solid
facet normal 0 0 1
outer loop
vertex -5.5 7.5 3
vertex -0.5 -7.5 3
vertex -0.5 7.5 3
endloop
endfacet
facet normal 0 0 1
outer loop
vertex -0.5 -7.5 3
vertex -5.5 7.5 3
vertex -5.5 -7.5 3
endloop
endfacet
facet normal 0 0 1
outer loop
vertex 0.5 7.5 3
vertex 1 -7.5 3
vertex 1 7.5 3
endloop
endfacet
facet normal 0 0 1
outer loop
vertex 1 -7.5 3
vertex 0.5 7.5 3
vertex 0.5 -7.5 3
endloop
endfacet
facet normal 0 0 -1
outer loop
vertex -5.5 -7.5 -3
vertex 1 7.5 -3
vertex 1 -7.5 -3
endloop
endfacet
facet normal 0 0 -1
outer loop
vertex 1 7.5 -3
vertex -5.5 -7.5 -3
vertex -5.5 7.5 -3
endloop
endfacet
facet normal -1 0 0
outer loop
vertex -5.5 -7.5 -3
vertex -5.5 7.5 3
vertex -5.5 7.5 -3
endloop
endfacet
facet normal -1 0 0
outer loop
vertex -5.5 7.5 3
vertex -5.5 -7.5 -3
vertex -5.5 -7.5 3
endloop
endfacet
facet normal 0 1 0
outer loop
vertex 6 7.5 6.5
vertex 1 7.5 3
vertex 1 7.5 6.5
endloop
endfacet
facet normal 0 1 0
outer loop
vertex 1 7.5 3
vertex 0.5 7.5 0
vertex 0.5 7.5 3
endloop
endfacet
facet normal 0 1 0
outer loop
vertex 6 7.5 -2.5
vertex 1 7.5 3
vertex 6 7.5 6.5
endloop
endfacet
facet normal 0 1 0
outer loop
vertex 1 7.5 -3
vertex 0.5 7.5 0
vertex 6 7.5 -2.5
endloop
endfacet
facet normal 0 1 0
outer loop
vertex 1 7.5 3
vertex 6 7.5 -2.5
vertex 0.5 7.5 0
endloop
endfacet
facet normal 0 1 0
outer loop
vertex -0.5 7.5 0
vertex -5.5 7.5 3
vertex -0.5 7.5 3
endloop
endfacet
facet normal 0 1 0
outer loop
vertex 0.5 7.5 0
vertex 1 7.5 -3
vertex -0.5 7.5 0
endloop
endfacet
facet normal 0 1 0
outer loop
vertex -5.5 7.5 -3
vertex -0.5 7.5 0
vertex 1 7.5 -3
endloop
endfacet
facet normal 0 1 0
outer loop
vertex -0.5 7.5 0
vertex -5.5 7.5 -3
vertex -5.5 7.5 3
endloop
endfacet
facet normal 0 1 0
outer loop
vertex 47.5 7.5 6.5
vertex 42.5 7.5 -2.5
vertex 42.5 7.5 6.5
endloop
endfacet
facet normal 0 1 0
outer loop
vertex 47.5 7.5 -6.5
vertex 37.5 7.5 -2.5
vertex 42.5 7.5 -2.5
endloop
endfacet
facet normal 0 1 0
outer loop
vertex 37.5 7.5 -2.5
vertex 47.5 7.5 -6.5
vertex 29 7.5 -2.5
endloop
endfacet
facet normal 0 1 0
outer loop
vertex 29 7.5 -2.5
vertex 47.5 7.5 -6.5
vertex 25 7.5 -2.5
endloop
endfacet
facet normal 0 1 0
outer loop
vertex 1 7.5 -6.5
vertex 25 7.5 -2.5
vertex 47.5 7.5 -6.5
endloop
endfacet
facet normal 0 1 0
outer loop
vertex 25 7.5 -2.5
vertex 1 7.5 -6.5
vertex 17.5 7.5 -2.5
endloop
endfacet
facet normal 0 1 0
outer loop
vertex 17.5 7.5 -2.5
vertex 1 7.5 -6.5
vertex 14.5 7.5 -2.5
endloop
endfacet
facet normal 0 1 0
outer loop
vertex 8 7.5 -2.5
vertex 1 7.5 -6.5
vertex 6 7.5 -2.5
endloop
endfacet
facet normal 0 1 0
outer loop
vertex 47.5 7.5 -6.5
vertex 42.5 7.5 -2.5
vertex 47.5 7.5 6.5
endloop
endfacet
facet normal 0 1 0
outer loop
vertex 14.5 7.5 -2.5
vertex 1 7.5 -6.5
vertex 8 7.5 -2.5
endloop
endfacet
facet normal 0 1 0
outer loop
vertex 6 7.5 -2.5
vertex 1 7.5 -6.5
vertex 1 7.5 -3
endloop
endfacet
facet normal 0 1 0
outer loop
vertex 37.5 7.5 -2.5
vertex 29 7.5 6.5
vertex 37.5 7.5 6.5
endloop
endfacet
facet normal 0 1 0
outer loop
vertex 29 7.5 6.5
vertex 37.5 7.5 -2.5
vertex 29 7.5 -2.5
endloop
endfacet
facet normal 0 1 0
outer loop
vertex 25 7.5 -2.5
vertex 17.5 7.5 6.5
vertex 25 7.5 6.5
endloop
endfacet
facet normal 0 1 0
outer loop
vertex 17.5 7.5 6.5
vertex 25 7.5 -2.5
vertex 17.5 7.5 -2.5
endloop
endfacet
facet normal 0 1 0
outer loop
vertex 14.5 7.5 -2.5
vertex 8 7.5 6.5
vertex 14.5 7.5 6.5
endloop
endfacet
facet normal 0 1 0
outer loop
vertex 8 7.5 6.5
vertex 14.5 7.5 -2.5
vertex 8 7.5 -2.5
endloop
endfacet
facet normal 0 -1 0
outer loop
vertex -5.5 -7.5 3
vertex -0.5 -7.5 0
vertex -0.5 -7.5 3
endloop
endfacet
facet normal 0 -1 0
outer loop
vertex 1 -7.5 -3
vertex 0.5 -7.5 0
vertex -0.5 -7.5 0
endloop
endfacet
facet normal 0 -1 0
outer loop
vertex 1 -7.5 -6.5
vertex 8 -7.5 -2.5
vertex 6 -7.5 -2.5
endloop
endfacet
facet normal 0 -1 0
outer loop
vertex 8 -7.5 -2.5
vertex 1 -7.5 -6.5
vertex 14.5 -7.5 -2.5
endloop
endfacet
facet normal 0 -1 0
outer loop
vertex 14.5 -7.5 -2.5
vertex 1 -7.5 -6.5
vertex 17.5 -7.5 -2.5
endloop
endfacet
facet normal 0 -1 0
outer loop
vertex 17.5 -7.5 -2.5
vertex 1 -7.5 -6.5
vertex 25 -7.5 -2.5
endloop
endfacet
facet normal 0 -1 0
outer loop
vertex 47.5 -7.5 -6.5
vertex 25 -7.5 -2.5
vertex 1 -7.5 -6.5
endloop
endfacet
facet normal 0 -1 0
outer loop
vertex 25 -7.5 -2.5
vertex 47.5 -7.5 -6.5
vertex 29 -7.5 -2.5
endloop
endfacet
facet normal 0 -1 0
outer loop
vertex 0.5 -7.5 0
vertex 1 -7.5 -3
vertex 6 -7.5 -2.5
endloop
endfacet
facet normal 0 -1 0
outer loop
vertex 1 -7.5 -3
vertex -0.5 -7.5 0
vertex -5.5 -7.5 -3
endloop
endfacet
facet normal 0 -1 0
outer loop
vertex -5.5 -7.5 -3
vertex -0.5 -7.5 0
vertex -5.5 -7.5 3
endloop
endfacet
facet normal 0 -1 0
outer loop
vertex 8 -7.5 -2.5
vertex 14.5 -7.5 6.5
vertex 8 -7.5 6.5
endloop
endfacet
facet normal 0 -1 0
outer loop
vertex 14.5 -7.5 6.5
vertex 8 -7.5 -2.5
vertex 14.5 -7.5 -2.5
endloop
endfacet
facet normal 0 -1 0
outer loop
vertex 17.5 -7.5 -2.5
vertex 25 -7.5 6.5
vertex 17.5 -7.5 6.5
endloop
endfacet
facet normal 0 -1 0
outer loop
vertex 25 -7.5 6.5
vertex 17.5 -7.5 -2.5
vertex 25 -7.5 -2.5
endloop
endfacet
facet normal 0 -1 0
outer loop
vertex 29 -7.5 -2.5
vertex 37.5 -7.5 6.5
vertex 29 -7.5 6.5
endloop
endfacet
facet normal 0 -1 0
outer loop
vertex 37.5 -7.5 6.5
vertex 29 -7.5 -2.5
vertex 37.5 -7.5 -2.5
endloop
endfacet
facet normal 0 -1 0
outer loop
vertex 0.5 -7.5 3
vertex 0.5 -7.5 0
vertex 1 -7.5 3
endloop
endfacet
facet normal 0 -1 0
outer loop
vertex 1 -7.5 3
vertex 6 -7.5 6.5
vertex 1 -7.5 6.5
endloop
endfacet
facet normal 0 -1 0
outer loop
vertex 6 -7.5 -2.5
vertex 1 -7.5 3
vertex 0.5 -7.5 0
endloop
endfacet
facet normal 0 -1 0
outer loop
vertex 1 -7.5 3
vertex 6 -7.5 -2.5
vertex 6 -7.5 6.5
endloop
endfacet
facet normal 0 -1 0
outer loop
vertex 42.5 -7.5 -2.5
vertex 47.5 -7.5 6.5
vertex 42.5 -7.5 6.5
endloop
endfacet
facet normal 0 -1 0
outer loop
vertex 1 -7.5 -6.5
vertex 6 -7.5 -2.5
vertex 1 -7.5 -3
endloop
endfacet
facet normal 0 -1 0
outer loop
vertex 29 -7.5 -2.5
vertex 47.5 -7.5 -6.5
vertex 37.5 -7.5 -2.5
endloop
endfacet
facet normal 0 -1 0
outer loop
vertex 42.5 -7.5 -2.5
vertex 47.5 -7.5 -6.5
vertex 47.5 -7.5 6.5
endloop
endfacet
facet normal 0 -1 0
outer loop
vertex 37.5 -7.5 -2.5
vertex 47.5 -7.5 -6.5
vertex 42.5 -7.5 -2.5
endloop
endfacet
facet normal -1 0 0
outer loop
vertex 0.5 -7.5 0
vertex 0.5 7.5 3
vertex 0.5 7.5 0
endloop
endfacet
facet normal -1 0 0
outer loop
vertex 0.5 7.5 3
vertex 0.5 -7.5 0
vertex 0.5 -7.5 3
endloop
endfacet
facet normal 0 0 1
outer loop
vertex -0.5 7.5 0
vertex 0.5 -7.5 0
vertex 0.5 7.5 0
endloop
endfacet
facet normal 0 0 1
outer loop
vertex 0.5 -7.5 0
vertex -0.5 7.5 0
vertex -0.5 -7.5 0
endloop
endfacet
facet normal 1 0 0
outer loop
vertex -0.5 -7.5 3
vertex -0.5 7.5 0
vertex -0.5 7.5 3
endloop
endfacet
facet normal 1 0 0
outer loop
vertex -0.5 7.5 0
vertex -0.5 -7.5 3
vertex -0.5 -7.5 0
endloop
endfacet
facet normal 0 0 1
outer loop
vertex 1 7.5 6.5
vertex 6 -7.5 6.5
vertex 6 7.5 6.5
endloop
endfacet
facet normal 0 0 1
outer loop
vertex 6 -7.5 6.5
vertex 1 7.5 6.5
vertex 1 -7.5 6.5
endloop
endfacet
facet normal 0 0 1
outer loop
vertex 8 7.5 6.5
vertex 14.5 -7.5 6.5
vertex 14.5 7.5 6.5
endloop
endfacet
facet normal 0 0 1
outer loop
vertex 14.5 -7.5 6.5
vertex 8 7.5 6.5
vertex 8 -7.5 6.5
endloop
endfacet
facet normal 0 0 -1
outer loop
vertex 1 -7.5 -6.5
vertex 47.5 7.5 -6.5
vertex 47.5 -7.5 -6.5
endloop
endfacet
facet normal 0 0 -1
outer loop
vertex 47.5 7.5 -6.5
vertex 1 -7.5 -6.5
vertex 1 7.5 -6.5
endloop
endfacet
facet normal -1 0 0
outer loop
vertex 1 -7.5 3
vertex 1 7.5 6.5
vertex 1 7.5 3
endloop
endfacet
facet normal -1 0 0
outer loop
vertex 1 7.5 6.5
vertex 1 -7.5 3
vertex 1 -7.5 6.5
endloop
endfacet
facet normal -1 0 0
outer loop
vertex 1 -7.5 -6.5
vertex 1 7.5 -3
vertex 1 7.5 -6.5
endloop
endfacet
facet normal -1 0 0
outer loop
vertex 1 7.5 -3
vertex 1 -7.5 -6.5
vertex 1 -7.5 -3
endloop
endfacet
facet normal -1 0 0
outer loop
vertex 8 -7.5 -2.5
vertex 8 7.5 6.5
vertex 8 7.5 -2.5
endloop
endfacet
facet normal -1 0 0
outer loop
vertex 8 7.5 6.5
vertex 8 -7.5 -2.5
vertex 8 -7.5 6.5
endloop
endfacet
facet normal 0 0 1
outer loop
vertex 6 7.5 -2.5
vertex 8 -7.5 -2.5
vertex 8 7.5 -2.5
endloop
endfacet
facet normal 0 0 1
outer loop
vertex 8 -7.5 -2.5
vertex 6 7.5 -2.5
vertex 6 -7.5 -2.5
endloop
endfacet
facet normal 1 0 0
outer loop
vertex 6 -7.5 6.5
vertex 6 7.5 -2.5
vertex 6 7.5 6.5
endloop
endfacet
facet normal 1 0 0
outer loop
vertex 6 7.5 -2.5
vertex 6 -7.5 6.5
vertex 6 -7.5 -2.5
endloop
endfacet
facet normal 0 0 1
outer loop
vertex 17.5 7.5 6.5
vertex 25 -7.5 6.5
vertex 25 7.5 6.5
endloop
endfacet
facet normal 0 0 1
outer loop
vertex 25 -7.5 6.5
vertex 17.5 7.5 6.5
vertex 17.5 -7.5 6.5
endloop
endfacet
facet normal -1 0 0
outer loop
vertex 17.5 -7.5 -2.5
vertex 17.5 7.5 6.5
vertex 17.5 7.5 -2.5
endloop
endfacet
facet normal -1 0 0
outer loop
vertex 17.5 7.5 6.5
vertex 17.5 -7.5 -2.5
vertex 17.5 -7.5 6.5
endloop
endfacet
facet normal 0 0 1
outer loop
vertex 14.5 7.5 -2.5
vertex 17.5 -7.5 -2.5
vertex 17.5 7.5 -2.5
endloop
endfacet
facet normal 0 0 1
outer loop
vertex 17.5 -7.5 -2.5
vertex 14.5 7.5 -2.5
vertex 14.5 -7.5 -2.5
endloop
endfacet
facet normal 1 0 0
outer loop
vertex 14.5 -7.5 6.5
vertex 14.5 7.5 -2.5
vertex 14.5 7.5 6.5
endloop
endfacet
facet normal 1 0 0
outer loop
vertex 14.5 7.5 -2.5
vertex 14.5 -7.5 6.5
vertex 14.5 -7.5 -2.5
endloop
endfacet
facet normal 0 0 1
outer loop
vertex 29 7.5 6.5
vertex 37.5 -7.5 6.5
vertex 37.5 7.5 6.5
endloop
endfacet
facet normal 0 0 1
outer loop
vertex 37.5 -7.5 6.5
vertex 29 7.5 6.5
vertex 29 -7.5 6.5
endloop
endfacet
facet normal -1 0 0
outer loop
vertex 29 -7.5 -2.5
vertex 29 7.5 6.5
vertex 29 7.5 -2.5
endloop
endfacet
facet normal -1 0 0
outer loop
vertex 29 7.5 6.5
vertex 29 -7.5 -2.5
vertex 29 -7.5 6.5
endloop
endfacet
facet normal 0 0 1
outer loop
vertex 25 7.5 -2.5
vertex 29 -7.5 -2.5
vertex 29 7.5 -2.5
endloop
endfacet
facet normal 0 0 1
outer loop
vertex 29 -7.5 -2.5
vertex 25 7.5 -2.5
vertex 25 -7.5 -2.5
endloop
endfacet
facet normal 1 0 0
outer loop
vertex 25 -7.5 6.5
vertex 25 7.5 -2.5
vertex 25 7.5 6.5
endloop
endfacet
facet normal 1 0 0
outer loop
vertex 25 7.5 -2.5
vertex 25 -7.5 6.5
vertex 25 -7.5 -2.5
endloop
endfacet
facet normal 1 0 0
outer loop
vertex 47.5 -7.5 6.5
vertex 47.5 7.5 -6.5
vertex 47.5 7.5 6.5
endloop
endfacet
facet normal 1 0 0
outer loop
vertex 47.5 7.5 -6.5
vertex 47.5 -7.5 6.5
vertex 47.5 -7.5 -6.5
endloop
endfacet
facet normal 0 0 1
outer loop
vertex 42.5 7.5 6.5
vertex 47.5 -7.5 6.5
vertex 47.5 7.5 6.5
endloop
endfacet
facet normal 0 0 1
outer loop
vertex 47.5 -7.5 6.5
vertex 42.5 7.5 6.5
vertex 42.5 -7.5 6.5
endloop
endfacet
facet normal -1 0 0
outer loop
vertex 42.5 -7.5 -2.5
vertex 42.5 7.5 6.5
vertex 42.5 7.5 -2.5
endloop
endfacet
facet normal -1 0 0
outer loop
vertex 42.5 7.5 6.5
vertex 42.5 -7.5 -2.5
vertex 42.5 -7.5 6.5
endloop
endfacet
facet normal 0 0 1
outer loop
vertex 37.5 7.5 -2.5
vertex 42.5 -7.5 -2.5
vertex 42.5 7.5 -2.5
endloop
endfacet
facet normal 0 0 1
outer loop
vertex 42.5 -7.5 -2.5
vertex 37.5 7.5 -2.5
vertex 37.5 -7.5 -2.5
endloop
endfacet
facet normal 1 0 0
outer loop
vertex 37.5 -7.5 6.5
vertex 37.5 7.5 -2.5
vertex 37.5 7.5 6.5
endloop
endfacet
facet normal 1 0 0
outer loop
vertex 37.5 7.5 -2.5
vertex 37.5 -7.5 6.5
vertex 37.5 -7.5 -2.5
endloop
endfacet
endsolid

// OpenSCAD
union() {
	translate(v = [0, 0, 0]) {
		difference() {
			cube(center = true, size = [11, 15, 6]);
			translate(v = [0, 0, 2.5000000000]) {
				cube(center = true, size = [1, 20, 5]);
			}
		}
	}
	translate(v = [7, 0, 0]) {
		difference() {
			cube(center = true, size = [12, 15, 13]);
			translate(v = [0, 0, 2.5000000000]) {
				cube(center = true, size = [2, 20, 10]);
			}
		}
	}
	translate(v = [16, 0, 0]) {
		difference() {
			cube(center = true, size = [13, 15, 13]);
			translate(v = [0, 0, 2.5000000000]) {
				cube(center = true, size = [3, 20, 10]);
			}
		}
	}
	translate(v = [27, 0, 0]) {
		difference() {
			cube(center = true, size = [14, 15, 13]);
			translate(v = [0, 0, 2.5000000000]) {
				cube(center = true, size = [4, 20, 10]);
			}
		}
	}
	translate(v = [40, 0, 0]) {
		difference() {
			cube(center = true, size = [15, 15, 13]);
			translate(v = [0, 0, 2.5000000000]) {
				cube(center = true, size = [5, 20, 10]);
			}
		}
	}
}
